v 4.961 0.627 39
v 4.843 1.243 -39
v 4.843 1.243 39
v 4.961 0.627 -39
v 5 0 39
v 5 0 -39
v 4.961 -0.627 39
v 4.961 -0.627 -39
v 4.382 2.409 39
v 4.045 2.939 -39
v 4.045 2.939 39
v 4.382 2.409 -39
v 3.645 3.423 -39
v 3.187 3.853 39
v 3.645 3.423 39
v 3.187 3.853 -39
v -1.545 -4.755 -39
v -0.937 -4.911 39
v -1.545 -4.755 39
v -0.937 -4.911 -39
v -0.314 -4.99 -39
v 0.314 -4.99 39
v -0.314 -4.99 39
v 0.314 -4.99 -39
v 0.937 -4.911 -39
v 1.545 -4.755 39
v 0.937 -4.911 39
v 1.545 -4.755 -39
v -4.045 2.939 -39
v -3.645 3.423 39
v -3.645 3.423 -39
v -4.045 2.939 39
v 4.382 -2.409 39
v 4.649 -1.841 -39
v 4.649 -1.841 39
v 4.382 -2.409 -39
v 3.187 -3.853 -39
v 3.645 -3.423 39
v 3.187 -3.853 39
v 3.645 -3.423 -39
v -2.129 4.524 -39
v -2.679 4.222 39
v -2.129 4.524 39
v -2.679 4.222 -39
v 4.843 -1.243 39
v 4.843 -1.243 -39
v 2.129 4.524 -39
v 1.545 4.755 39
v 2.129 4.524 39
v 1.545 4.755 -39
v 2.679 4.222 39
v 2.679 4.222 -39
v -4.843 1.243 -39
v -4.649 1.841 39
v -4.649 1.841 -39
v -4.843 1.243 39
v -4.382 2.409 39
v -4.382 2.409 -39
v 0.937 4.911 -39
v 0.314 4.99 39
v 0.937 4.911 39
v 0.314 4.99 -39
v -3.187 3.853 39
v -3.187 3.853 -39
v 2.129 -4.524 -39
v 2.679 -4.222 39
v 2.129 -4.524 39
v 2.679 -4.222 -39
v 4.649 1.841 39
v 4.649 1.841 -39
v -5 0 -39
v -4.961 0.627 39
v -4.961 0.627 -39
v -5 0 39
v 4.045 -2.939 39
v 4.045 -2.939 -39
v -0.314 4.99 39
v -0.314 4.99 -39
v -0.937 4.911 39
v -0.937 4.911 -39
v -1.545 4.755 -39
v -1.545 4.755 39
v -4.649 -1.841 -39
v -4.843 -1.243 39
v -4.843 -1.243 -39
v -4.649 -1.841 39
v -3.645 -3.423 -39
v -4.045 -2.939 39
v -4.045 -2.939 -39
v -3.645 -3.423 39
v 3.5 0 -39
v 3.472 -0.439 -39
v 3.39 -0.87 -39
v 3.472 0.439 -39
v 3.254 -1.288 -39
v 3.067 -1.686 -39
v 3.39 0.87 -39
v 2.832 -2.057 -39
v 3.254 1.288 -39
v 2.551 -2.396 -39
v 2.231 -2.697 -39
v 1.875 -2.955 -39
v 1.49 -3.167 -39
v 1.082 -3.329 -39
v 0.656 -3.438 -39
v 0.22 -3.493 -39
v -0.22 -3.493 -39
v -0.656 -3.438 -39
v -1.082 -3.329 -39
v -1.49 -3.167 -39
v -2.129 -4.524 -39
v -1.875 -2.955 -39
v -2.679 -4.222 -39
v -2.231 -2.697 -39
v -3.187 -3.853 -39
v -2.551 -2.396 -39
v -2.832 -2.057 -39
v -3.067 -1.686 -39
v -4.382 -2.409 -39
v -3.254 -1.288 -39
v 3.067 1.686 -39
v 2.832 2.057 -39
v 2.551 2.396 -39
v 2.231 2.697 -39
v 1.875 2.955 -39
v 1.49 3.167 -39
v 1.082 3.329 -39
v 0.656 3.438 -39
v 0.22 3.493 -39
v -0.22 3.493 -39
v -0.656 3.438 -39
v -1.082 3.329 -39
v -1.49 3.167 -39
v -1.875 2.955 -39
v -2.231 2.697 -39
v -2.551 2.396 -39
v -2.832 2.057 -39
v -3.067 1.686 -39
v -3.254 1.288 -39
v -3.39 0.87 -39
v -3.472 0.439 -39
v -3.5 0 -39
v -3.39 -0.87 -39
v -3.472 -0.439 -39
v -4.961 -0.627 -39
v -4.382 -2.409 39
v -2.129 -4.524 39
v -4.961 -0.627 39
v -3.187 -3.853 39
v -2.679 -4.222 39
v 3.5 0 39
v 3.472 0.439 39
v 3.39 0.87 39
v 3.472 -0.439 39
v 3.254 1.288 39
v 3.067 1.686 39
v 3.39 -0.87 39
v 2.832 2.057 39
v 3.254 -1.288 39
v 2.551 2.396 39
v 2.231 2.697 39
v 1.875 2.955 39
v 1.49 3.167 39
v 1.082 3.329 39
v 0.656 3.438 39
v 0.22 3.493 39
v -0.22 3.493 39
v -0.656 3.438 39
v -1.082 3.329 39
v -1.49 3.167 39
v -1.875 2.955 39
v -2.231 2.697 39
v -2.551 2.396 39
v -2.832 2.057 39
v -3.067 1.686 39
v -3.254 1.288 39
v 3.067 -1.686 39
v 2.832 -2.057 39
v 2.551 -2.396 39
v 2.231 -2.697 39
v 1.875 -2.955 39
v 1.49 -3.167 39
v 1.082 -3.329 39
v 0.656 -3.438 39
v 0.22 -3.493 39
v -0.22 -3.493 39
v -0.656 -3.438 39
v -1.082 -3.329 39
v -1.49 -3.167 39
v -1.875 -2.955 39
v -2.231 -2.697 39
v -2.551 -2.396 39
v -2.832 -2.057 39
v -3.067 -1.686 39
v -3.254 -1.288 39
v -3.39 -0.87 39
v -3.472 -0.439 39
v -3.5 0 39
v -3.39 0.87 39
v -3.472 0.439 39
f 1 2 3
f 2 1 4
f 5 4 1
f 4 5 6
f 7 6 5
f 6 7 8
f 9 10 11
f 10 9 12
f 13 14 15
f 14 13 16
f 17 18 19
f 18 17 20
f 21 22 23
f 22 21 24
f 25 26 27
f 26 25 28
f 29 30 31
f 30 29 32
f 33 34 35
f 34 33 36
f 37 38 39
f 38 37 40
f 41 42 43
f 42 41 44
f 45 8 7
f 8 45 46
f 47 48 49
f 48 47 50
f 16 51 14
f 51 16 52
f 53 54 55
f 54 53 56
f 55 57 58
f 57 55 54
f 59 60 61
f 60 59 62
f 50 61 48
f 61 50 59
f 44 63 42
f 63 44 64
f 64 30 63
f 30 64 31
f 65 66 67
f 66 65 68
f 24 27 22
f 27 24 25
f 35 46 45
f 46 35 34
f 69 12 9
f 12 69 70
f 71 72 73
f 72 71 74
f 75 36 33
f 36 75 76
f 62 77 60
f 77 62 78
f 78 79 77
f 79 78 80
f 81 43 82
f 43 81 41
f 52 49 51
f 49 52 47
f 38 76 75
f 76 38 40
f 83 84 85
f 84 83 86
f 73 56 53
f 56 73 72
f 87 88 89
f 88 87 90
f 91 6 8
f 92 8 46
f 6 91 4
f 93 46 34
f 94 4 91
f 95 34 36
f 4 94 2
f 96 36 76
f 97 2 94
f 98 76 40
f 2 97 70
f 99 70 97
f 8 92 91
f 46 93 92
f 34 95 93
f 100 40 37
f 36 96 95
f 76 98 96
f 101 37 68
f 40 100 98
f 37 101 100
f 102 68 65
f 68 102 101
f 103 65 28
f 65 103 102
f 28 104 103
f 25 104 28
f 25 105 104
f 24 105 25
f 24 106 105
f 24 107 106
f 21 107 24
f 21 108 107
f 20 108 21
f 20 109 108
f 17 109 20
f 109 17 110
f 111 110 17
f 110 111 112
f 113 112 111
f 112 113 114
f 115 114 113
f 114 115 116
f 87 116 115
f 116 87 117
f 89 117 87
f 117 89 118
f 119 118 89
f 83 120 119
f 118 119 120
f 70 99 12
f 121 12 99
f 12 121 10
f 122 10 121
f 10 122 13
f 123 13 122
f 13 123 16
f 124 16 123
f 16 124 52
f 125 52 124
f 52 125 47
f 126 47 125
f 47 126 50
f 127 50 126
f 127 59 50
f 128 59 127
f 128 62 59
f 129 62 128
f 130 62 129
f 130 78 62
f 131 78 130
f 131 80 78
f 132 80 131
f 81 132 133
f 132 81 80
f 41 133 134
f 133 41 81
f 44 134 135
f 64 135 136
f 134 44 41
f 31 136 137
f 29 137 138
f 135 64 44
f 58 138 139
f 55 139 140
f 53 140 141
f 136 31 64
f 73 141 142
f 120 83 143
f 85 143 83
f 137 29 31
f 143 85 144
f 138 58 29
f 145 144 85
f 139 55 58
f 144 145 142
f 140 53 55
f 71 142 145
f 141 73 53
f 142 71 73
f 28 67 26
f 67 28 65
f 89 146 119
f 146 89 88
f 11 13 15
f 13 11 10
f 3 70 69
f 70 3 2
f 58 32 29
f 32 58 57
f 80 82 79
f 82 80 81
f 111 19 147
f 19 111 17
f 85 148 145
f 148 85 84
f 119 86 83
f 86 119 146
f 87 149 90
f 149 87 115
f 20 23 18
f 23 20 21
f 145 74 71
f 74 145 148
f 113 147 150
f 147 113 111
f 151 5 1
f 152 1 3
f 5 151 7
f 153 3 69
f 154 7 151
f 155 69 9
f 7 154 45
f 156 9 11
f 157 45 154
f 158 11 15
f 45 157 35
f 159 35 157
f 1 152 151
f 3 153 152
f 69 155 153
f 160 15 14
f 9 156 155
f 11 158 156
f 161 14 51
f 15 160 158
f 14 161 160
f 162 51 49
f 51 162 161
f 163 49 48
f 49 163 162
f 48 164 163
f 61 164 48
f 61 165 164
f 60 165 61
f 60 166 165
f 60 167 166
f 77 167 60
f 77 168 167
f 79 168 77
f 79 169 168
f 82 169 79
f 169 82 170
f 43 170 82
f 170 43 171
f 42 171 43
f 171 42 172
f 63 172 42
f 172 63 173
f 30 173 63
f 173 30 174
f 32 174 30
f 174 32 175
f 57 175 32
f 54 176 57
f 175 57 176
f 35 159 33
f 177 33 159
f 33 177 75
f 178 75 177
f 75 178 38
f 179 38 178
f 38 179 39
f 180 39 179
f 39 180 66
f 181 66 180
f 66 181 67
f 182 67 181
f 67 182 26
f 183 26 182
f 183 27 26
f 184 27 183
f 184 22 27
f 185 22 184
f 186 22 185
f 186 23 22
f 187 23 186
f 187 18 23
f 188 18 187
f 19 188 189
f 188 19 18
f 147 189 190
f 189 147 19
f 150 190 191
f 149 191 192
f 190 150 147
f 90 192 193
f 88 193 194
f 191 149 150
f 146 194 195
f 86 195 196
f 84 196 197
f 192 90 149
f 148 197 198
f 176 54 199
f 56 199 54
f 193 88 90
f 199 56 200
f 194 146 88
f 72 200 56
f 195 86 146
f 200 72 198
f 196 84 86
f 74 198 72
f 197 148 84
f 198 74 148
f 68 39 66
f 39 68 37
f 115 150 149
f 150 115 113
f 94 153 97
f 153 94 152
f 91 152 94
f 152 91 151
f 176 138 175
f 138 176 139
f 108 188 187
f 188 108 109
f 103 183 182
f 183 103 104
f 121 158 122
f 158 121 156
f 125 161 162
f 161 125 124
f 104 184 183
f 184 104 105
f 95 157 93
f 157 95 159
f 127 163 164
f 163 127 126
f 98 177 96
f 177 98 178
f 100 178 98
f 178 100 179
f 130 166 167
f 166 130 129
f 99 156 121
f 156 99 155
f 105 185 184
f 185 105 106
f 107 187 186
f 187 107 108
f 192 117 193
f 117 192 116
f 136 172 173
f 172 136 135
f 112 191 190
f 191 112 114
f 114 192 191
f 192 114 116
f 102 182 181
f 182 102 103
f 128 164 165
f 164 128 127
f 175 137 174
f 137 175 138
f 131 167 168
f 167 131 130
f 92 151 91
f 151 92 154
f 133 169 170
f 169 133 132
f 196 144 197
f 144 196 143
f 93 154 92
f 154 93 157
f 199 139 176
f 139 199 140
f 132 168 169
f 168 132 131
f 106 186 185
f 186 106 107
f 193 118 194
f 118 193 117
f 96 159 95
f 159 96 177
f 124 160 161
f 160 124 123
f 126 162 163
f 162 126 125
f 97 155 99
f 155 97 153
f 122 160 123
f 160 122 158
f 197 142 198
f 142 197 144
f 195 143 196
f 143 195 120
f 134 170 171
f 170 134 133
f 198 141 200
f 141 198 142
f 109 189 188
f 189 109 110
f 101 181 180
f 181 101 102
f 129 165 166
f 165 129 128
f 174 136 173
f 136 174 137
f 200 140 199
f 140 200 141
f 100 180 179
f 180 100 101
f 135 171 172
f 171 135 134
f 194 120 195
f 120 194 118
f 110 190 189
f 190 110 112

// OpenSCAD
$fn = 50;


difference() {
	union() {
		translate(v = [0, 0, -39.0000000000]) {
			cylinder(h = 78, r = 5.0000000000);
		}
	}
	union() {
		translate(v = [0, 0, -100.0000000000]) {
			cylinder(h = 200, r = 3.5000000000);
		}
	}
}
